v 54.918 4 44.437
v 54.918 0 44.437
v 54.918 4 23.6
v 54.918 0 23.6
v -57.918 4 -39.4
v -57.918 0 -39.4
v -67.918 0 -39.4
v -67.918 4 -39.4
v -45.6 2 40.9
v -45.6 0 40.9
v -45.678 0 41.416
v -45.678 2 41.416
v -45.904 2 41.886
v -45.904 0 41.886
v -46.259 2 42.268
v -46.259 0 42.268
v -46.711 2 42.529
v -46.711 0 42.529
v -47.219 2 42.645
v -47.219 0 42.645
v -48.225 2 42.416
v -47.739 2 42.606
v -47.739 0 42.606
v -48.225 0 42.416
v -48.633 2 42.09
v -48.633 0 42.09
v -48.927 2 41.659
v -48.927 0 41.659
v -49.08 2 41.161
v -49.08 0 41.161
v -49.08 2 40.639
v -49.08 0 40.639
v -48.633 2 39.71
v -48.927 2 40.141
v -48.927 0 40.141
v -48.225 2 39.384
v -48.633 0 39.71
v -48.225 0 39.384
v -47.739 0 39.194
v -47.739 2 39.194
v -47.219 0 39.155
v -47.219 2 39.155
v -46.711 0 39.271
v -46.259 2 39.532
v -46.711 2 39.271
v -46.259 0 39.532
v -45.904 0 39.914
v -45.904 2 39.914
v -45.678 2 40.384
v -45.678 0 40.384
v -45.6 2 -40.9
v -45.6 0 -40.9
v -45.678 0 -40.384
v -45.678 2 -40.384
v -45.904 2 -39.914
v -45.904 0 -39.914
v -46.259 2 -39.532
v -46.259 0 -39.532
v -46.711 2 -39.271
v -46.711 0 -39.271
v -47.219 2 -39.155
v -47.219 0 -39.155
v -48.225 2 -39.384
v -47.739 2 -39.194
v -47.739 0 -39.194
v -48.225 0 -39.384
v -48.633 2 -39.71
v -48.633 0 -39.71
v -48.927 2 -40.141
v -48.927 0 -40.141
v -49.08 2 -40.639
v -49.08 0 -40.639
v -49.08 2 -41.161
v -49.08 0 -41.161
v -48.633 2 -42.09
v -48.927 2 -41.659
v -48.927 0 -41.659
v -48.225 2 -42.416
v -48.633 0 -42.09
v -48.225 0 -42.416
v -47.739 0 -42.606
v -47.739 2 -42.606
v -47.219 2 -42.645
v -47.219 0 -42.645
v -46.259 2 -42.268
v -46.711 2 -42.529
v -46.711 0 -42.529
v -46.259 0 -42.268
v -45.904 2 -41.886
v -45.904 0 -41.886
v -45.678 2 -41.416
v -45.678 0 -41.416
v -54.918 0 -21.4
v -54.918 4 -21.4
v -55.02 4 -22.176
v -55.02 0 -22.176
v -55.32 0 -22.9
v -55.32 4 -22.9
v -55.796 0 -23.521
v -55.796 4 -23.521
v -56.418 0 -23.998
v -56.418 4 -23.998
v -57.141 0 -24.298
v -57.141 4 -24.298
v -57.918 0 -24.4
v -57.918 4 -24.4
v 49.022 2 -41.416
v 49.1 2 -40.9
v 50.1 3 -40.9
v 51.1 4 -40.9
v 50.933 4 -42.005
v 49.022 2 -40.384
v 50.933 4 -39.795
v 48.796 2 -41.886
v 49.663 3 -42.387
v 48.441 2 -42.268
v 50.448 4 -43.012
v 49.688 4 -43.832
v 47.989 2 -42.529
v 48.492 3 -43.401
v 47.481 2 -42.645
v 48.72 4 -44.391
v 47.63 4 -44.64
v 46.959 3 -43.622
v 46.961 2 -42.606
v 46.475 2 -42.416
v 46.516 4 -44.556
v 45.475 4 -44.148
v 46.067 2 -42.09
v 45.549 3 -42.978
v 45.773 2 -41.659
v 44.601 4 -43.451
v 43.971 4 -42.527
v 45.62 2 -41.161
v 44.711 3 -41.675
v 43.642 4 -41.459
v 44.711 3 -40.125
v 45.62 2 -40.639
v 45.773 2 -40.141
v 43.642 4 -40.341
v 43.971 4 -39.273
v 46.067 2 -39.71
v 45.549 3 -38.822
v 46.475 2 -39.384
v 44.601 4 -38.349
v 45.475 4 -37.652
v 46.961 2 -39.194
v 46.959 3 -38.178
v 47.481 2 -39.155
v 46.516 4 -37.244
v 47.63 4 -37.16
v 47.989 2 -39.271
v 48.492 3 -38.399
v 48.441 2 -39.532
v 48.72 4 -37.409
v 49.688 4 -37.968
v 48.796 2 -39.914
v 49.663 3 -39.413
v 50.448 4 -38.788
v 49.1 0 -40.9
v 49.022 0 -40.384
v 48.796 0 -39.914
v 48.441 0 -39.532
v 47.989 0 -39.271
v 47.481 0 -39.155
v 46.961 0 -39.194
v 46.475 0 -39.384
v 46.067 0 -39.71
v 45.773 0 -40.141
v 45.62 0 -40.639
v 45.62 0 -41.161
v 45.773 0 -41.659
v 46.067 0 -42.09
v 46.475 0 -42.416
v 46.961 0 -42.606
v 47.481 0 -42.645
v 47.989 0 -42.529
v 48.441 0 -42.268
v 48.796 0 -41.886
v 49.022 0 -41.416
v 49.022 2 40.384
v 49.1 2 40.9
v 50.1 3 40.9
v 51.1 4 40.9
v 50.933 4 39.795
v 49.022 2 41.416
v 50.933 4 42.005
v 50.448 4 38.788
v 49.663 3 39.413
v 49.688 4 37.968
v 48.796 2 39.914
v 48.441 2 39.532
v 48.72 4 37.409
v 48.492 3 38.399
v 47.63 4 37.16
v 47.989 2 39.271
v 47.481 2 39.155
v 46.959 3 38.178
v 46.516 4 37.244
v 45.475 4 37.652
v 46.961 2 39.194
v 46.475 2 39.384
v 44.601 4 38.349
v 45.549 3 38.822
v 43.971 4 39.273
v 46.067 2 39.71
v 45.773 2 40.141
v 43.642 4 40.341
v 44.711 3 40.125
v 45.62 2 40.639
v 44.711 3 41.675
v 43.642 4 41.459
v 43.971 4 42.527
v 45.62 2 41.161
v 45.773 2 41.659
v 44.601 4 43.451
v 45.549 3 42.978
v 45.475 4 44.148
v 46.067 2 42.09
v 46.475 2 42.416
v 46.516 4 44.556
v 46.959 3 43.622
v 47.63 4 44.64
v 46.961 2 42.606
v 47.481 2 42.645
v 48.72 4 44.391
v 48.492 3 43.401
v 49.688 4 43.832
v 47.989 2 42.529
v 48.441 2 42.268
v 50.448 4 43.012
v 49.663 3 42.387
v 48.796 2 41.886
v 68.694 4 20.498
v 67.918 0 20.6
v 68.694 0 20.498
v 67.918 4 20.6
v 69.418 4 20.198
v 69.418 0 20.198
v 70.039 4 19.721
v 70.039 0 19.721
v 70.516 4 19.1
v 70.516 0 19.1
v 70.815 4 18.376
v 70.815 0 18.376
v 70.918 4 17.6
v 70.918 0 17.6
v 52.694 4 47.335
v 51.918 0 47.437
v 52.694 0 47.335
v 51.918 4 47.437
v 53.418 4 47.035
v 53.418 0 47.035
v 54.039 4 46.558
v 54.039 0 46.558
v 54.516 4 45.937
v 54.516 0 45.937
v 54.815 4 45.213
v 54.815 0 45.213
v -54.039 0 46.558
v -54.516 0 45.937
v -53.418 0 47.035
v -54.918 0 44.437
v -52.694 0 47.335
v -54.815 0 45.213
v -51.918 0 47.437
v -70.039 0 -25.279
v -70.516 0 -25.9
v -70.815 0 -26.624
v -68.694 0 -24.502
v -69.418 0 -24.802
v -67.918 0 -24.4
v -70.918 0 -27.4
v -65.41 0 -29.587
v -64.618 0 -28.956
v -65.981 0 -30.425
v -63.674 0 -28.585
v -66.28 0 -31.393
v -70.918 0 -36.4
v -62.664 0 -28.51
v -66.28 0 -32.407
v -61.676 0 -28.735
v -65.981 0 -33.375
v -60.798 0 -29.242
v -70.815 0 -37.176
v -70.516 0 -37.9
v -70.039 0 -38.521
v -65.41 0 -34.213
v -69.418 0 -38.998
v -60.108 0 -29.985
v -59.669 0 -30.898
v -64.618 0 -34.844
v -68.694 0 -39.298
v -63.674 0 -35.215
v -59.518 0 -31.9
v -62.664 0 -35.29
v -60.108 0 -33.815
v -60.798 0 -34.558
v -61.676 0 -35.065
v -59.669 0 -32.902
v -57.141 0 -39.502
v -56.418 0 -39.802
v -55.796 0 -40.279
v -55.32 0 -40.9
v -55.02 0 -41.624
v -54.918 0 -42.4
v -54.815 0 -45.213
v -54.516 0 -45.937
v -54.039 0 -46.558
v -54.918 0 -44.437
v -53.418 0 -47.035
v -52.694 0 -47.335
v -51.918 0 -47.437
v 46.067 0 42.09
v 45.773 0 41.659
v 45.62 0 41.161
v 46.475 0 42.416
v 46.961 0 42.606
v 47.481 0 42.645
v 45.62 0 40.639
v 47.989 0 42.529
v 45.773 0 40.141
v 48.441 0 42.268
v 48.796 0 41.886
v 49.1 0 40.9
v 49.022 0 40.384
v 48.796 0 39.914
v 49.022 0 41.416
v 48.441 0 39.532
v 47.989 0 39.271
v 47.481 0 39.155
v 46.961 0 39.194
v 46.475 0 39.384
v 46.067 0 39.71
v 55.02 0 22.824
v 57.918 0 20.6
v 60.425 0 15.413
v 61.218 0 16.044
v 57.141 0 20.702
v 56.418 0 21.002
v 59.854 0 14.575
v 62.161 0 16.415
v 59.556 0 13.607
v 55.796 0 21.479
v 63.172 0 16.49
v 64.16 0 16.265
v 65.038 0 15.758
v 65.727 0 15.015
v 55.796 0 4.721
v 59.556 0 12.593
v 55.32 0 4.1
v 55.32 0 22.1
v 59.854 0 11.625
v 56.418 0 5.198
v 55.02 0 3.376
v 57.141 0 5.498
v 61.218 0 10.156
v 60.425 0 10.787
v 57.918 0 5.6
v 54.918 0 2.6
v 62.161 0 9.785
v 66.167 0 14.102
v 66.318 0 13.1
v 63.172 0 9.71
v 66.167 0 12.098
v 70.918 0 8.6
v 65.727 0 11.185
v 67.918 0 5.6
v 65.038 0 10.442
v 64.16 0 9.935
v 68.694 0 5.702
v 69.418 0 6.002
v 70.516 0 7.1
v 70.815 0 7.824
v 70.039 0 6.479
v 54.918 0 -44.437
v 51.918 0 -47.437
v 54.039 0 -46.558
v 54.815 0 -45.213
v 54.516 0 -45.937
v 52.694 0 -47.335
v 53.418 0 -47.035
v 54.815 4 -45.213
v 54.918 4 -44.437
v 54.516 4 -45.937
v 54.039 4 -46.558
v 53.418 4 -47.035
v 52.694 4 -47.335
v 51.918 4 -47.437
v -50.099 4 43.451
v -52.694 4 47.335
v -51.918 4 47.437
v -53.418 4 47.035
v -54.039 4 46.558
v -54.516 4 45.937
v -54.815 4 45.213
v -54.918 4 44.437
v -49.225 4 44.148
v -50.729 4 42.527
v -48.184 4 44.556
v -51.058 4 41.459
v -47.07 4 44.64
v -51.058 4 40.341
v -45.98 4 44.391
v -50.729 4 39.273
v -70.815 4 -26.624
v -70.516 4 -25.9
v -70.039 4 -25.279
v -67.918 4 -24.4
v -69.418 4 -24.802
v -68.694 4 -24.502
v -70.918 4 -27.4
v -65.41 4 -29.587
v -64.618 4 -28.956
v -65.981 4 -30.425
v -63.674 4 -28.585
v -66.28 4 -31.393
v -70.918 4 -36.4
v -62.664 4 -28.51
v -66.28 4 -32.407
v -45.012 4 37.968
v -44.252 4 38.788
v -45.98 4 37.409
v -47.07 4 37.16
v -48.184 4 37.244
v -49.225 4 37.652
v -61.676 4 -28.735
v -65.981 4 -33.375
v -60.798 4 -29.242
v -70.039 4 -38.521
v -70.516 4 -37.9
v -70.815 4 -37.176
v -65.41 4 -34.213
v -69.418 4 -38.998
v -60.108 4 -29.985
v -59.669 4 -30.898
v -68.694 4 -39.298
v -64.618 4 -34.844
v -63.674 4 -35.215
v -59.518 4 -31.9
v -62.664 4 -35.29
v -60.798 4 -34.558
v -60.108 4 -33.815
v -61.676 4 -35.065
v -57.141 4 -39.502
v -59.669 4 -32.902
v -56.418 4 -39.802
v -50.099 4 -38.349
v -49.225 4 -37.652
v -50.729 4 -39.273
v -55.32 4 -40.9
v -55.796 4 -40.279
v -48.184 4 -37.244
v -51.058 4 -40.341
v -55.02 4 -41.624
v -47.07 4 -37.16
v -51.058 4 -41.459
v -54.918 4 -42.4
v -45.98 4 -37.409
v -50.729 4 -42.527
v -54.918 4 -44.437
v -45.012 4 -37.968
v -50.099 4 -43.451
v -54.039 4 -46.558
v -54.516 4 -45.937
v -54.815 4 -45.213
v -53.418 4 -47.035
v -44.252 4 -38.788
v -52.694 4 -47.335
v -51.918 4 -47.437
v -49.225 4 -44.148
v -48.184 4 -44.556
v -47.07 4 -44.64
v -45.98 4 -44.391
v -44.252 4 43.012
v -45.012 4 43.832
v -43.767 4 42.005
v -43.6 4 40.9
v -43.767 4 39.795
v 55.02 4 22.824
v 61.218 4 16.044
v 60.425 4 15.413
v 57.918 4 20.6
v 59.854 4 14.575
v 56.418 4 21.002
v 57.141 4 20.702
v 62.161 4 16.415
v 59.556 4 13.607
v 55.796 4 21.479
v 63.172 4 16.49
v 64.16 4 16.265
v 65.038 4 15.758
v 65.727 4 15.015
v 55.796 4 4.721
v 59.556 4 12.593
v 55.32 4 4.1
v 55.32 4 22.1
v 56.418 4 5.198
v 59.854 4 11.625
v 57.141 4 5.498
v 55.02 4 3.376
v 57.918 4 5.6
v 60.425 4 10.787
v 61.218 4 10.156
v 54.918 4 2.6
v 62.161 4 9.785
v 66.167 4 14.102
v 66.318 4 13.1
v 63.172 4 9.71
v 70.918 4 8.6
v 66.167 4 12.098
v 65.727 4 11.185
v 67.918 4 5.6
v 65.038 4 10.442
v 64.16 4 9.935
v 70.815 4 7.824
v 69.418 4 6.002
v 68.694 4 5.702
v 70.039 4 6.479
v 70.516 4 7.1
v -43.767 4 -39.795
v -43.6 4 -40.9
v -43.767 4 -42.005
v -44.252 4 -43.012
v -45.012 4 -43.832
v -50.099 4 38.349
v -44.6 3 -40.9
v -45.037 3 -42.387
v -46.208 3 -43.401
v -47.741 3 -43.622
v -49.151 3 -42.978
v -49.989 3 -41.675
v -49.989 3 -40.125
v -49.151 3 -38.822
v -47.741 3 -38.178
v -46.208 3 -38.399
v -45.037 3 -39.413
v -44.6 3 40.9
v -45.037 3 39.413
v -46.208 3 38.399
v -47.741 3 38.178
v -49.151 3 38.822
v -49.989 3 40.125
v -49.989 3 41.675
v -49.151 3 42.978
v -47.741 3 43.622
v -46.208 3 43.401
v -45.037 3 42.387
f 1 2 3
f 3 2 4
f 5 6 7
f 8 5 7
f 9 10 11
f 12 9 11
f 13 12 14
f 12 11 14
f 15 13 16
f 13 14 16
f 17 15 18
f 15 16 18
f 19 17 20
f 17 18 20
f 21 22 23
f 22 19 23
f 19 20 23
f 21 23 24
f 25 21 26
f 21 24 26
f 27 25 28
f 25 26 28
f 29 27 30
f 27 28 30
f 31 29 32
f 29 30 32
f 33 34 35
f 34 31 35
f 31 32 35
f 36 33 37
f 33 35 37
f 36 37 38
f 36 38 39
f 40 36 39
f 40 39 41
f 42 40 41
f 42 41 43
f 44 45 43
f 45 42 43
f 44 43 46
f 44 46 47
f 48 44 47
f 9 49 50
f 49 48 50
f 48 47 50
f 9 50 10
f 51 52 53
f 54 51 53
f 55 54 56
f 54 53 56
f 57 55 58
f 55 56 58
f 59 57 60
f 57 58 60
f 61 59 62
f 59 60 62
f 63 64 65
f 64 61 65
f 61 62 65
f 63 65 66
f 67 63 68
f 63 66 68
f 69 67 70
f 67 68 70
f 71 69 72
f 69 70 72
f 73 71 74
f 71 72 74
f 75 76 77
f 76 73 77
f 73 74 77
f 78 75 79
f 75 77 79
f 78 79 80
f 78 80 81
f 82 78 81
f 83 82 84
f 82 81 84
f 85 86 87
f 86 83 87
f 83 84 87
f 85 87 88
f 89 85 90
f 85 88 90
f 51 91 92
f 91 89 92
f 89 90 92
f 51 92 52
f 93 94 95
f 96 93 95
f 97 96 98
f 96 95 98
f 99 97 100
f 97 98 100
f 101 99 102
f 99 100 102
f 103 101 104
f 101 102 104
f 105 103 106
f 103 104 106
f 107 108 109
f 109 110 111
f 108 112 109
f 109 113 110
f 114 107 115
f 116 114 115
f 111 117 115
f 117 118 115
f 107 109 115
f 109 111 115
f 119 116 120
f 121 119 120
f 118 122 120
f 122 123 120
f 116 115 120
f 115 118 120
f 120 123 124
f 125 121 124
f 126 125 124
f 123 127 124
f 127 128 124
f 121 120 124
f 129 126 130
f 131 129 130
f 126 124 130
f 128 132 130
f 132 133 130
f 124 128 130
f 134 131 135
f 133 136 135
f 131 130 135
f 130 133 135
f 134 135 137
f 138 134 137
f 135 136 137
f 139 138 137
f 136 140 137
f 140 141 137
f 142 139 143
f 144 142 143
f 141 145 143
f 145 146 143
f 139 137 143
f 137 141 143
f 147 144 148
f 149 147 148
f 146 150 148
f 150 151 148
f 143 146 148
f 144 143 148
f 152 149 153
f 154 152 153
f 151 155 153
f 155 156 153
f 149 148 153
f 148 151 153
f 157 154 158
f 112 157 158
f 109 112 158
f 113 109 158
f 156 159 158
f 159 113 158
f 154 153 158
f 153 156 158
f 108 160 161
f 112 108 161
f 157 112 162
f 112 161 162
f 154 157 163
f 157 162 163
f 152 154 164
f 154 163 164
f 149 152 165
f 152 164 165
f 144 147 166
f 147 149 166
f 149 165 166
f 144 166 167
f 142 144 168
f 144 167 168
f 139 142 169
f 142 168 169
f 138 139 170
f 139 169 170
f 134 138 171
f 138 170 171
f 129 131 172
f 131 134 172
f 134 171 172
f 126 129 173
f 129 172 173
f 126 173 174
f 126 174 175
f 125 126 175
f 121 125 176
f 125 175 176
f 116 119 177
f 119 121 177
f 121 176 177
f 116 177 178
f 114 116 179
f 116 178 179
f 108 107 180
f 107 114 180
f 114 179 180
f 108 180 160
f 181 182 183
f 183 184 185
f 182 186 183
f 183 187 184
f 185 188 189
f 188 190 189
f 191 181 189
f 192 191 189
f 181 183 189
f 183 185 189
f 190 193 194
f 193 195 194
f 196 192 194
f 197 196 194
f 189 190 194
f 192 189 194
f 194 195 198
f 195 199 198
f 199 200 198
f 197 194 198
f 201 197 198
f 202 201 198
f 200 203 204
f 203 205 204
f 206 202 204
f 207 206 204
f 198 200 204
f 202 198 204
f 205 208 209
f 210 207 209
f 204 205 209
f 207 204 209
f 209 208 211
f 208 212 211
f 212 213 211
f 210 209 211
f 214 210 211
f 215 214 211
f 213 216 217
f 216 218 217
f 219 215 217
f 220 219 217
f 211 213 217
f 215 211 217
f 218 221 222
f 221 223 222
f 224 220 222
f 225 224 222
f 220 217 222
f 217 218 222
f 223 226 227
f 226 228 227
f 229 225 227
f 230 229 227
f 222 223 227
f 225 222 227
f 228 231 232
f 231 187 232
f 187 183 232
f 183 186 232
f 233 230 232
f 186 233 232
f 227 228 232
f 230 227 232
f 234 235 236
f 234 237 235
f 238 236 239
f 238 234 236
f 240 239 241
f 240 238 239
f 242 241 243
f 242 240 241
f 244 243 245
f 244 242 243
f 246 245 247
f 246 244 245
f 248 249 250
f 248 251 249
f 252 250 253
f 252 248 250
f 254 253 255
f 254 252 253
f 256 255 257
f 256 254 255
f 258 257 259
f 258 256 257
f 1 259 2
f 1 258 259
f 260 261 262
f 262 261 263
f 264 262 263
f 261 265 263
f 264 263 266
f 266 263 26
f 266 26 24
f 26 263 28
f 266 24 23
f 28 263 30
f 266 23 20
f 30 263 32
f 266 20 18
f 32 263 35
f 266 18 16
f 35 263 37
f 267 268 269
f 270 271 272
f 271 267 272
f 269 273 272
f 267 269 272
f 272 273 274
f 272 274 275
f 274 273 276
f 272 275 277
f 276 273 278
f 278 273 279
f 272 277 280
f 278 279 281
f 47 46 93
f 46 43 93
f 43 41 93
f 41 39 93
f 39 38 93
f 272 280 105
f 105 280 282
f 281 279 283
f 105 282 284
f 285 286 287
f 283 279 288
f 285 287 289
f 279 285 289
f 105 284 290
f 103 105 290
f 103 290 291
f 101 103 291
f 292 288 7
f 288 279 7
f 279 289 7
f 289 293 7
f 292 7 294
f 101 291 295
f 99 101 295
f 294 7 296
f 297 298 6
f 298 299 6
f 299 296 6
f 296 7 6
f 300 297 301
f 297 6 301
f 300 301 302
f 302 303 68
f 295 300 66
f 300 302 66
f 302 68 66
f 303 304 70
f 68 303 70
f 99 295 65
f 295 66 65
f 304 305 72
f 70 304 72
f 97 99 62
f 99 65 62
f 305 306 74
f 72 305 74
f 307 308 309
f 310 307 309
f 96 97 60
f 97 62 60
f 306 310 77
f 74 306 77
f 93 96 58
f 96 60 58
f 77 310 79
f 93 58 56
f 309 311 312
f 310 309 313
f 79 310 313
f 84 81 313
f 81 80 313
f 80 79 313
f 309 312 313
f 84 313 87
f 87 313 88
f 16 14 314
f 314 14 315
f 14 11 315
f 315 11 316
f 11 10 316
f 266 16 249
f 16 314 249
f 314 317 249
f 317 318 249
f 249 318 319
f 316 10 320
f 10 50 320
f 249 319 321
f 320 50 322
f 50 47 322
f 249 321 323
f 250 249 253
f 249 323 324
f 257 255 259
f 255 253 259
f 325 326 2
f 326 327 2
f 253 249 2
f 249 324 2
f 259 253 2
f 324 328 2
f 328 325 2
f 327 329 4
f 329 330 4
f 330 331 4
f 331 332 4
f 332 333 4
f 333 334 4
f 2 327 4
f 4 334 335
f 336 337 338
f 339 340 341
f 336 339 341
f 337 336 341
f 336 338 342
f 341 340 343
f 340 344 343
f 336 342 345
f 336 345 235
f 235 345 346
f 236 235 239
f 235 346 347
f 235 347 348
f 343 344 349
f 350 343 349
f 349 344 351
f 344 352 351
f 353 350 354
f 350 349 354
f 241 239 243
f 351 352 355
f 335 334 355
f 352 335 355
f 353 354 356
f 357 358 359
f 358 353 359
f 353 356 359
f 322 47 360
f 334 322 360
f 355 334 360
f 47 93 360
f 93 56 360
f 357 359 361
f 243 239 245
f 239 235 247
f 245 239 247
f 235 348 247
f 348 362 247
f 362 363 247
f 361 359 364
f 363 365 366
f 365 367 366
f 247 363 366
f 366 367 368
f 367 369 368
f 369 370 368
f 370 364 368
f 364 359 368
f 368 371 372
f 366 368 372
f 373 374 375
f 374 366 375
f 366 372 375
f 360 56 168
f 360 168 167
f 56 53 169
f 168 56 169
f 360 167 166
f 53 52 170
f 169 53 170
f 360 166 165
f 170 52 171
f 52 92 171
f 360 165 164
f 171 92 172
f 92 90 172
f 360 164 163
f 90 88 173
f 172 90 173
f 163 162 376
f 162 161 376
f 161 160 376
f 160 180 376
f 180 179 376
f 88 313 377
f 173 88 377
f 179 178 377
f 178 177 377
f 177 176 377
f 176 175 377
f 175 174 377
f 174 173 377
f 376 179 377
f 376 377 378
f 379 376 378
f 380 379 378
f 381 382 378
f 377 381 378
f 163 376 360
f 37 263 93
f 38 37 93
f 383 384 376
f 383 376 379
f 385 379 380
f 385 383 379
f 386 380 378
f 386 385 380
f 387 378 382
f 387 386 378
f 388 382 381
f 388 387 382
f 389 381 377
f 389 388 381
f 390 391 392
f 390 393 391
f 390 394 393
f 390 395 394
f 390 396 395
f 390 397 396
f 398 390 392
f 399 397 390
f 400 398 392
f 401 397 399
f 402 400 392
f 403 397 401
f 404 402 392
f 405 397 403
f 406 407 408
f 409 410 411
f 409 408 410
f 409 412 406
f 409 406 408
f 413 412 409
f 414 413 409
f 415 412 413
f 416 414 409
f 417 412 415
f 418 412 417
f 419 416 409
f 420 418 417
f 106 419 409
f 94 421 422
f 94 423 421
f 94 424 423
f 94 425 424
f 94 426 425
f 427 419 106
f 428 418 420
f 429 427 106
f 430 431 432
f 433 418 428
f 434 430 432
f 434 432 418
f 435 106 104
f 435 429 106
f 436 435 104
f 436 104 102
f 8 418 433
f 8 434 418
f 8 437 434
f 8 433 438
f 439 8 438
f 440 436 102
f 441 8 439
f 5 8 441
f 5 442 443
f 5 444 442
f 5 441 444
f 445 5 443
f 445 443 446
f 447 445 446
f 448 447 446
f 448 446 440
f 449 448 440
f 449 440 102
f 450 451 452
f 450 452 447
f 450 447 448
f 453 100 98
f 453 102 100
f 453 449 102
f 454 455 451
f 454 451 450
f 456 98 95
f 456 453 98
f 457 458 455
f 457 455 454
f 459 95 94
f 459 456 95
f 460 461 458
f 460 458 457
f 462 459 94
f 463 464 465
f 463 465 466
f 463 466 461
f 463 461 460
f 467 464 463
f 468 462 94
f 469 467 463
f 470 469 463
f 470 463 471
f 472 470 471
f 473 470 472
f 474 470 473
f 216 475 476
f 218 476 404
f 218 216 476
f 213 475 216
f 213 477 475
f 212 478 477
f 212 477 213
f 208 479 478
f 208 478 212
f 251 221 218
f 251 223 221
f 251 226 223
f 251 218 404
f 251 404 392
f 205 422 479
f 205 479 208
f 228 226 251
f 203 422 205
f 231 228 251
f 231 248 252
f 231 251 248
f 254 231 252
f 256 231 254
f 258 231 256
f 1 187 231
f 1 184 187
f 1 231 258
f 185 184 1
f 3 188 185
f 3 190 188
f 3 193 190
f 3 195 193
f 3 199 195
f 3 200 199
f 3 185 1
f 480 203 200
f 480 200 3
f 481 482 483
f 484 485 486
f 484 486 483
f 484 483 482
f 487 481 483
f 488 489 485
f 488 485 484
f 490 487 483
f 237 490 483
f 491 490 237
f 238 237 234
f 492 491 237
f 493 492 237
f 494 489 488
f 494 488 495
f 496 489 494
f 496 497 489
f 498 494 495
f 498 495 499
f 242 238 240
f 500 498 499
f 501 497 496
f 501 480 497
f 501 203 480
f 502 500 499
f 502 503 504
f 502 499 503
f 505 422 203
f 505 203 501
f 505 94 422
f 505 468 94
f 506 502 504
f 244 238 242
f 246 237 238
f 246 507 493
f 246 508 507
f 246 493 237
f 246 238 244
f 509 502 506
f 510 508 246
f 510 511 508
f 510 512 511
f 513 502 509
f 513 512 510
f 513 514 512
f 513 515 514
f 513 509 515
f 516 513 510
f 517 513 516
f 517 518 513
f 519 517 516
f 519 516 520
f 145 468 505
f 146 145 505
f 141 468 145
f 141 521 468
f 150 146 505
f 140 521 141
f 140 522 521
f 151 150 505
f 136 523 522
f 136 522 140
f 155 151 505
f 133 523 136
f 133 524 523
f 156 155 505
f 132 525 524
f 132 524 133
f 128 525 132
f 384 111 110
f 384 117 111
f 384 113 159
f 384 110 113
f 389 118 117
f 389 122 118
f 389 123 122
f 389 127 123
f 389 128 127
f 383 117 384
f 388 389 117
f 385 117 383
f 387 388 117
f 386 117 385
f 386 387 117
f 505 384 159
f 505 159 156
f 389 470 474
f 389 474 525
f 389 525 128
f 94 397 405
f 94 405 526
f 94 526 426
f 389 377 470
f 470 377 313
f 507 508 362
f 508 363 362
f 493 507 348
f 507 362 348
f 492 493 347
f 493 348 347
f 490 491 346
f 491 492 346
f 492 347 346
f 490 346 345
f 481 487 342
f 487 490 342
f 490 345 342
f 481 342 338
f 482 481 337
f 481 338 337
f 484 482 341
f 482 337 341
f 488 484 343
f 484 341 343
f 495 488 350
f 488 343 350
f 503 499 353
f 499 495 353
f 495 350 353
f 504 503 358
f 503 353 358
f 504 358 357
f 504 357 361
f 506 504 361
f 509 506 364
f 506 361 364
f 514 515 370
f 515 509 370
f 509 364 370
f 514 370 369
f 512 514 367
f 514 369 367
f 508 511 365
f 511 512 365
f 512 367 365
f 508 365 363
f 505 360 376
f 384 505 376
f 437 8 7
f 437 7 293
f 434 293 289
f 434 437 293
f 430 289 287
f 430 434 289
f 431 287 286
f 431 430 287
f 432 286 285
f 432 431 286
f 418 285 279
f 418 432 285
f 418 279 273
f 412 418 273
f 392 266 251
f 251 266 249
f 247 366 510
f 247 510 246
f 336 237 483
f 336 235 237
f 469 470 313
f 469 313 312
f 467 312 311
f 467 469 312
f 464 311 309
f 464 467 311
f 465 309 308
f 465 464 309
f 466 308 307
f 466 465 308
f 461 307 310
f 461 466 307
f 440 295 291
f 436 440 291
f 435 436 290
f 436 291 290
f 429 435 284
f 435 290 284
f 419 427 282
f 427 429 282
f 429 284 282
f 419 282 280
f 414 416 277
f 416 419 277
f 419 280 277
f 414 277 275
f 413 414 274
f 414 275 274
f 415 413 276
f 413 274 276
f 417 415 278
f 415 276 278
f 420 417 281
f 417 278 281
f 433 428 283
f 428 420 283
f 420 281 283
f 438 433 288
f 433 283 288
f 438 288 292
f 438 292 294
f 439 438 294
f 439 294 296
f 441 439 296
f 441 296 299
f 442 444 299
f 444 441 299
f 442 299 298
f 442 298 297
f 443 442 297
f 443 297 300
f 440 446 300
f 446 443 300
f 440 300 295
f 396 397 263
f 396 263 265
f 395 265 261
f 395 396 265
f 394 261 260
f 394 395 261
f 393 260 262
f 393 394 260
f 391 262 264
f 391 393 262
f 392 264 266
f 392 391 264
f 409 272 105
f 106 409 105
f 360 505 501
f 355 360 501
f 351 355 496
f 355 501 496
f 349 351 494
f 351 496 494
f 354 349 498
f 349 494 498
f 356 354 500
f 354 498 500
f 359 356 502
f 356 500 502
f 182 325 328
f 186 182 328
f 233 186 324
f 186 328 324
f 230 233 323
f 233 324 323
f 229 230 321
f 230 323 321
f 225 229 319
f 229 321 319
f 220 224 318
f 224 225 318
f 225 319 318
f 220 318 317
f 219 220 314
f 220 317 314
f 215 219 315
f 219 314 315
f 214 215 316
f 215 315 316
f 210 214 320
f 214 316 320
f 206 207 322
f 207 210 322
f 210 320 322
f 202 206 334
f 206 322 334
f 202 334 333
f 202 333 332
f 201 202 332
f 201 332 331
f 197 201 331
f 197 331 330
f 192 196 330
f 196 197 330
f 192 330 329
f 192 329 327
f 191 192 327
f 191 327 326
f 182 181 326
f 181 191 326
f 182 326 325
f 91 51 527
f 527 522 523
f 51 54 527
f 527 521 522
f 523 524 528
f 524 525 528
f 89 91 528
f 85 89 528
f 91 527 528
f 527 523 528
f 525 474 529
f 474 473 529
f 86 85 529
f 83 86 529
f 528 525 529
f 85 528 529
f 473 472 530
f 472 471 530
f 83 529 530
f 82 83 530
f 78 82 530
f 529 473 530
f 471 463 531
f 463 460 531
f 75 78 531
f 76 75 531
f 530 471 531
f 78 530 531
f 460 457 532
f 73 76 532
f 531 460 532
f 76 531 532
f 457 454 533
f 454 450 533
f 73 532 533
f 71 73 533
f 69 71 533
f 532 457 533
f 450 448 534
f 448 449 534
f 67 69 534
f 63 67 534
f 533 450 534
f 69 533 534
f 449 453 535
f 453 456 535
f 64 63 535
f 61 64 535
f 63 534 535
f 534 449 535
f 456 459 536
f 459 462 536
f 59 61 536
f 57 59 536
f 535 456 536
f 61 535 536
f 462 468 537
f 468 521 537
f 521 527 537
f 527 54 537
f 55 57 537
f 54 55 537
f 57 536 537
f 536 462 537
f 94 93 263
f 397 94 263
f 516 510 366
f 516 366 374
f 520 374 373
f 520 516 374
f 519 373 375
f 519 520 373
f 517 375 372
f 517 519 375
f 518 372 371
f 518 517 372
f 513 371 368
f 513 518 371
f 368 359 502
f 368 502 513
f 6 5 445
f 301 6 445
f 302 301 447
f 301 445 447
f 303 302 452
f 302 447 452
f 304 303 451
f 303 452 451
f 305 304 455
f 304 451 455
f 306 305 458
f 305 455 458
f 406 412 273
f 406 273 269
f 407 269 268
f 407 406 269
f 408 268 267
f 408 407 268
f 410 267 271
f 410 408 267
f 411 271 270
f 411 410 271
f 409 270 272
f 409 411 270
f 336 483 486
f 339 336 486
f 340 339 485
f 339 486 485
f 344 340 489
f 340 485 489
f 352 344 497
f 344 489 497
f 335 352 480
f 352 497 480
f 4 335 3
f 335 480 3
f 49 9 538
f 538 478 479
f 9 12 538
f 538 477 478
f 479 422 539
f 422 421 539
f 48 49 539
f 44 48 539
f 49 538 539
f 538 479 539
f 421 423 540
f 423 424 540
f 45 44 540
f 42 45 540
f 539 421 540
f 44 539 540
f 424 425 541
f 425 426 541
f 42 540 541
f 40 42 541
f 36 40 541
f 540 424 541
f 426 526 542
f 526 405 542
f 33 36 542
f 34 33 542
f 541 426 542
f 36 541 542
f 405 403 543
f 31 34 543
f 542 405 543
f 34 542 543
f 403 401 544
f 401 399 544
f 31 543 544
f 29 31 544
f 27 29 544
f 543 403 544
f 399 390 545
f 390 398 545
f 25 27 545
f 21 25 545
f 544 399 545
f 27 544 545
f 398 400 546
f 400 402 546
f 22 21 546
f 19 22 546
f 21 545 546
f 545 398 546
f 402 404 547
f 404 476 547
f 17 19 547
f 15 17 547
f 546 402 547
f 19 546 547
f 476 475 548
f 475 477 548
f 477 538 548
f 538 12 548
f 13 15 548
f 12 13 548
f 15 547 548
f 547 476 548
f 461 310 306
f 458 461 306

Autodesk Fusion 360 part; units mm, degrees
sketch "Sketch1" plane through (0, 0, 0) normal (0, 1, 0) x (1, 0, 0)
  line L0 (47.35, 40.9) -> (-47.35, 40.9) construction
  line L1 (-47.35, 40.9) -> (-47.35, -40.9) construction
  line L2 (-47.35, -40.9) -> (47.35, -40.9) construction
  line L3 (47.35, -40.9) -> (47.35, 40.9) construction
  line L4 (47.35, 40.9) -> (-47.35, -40.9) construction
  line L5 (-47.35, 40.9) -> (47.35, -40.9) construction
  line L6 (54.9177, 47.4368) -> (-54.9177, 47.4368)
  line L7 (-54.9177, 47.4368) -> (-54.9177, -47.4368)
  line L8 (-54.9177, -47.4368) -> (54.9177, -47.4368)
  line L9 (54.9177, -47.4368) -> (54.9177, 47.4368)
  line L10 (54.9177, 47.4368) -> (-54.9177, -47.4368) construction
  line L11 (-54.9177, 47.4368) -> (54.9177, -47.4368) construction
  circle A0 centre (47.35, 40.9) radius 1.75
  line L12 (0, 0) -> (0, 35) construction
  line L13 (0, 0) -> (-41.0628, 0) construction
  circle A1 centre (-47.35, 40.9) radius 1.75
  circle A2 centre (47.35, -40.9) radius 1.75
  circle A3 centre (-47.35, -40.9) radius 1.75
  line L14 (-54.9177, 39.4) -> (-70.9177, 39.4)
  line L15 (-70.9177, 39.4) -> (-70.9177, 24.4)
  line L16 (-70.9177, 24.4) -> (-54.9177, 24.4)
  line L17 (-54.9177, 24.4) -> (-54.9177, 39.4)
  line L18 (54.9177, -5.6) -> (70.9177, -5.6)
  line L19 (70.9177, -5.6) -> (70.9177, -20.6)
  line L20 (70.9177, -20.6) -> (54.9177, -20.6)
  line L21 (54.9177, -20.6) -> (54.9177, -5.6)
  line L22 (81.8257, 31.9) -> (62.2169, 31.9) construction
  line L23 (80.3912, -13.1) -> (59.348, -13.1) construction
  circle A4 centre (-62.9177, 31.9) radius 3.4
  circle A5 centre (62.9177, -13.1) radius 3.4
  dimension "d1" = 3.5
  dimension "d2" = 81.8
  dimension "d3" = 94.7
  dimension "d4" = 10
  dimension "d5" = 16
  dimension "d6" = 15
  dimension "d7" = 15
  dimension "d9" = 16
  dimension "d10" = 45
  dimension "d11" = 9
  dimension "d12" = 6.8
  dimension "d13" = 6.8
  dimension "d14" = 8
  dimension "d15" = 8
extrude "Extrude1" add sketch "Sketch1" along normal blind 4
fillet "Fillet1" radius 3 12 edges at (-70.9177, 2, -24.4) (-70.9177, 2, -39.4) (-54.9177, 2, -39.4) (-54.9177, 2, -47.4368) (-54.9177, 2, 47.4368) (-54.9177, 2, -24.4) (54.9177, 2, 47.4368) (54.9177, 2, 20.6) (70.9177, 2, 20.6) (70.9177, 2, 5.6) (54.9177, 2, 5.6) (54.9177, 2, -47.4368)
chamfer "Chamfer1" distance 2 angle 45 4 edges at (45.7184, 4, 40.2672) (-48.9816, 4, 40.2672) (-48.9816, 4, -41.5328) (45.7184, 4, -41.5328)
